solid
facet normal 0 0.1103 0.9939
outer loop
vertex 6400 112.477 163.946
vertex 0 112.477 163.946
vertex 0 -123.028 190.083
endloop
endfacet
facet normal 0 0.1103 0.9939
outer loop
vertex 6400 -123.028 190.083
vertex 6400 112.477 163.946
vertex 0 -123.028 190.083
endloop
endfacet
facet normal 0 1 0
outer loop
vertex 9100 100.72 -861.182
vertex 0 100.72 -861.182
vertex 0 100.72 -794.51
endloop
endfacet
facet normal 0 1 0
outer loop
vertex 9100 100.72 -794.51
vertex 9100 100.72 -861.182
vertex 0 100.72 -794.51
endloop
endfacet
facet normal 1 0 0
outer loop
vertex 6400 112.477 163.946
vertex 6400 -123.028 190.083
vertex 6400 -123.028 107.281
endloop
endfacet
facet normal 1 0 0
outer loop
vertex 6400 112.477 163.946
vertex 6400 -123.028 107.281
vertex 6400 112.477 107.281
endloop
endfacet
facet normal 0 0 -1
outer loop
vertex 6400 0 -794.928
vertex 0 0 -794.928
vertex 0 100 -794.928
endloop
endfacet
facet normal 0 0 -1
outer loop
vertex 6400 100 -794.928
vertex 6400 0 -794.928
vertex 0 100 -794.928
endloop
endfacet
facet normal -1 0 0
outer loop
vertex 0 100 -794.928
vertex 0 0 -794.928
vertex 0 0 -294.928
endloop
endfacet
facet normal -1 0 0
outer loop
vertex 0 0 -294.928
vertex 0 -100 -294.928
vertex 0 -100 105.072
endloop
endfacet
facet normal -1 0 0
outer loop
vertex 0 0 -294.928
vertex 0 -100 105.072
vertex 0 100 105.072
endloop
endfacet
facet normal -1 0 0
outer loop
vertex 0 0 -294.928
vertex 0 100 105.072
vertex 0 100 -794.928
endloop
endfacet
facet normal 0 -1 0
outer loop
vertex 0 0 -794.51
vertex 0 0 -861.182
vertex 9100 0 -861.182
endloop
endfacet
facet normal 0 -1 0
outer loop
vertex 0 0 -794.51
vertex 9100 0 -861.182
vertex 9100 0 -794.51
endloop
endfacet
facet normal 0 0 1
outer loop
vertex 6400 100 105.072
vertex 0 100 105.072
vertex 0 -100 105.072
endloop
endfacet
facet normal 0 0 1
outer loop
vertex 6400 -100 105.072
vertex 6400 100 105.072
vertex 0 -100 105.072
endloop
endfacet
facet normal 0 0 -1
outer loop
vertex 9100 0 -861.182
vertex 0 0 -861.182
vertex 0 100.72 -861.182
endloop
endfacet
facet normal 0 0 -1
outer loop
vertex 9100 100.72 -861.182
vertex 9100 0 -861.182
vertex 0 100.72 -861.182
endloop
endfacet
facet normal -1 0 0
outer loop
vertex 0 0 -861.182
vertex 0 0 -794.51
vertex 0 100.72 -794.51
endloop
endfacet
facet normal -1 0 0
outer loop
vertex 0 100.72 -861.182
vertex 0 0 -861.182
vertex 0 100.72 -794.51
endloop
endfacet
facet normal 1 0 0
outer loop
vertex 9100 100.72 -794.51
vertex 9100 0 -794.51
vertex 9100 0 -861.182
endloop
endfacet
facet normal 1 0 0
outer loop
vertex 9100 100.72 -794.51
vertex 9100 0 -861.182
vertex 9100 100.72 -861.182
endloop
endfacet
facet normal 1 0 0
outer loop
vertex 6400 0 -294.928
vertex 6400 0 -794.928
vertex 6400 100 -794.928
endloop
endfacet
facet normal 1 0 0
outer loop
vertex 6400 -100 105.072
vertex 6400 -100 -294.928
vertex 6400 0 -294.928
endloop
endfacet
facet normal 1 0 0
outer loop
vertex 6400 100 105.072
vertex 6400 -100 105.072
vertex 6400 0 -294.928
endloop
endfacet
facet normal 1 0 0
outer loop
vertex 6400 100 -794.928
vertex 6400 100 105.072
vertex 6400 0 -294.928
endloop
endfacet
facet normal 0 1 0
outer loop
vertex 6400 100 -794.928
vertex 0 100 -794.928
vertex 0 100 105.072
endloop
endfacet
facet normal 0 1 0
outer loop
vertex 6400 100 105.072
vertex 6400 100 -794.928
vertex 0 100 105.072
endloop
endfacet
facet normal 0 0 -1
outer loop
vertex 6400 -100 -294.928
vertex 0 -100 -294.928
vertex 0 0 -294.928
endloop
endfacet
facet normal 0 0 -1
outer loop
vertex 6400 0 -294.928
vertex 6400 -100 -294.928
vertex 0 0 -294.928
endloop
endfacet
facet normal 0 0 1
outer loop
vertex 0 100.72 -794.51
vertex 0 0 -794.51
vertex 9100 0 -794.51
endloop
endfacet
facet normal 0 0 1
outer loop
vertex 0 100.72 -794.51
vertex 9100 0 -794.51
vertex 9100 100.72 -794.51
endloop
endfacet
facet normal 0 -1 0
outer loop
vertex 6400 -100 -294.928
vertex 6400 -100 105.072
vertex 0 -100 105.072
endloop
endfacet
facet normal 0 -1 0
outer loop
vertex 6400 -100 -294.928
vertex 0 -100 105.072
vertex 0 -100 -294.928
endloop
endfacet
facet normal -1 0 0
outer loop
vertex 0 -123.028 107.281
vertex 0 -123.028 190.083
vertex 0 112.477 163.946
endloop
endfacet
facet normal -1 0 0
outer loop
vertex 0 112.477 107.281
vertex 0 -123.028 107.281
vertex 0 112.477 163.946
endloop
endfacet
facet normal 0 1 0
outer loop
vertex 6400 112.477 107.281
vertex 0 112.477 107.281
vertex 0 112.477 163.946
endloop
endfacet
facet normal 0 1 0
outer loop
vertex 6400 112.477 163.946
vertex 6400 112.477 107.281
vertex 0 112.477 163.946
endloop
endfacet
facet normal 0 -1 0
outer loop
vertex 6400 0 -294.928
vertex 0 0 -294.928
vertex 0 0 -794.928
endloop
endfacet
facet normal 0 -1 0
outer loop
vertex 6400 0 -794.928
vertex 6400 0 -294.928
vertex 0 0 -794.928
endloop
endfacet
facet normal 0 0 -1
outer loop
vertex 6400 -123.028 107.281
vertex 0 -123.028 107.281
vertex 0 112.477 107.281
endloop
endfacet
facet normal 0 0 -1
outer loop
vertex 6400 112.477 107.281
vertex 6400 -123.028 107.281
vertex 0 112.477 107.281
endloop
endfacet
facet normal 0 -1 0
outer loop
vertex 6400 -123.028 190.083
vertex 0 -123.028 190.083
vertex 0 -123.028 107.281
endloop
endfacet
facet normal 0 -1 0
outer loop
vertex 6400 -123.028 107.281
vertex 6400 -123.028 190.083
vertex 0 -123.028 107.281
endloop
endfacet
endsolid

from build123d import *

# Parameters (mm, degrees)
F3_DEPTH = 6400
F4_DEPTH = 6400
F2_W     = 100.719914
F2_H     = 66.671669
F5_DEPTH = 9100


with BuildPart() as f3:
    # F0 (on Right) → F3 (new body)
    with BuildSketch(Plane.YZ):
        Polygon((-100, 105.07169), (-100, -294.92831), (0, -294.92831), (0, -794.92831), (100, -794.92831), (100, -294.92831), (100, 105.07169), align=None)
    extrude(amount=F3_DEPTH)


with BuildPart() as f4:
    # F1 (on Right) → F4 (new body)
    with BuildSketch(Plane.YZ):
        Polygon((-123.028347, 190.082815), (-123.028347, 107.28091), (112.476942, 107.28091), (112.476942, 163.945827), align=None)
    extrude(amount=F4_DEPTH)


with BuildPart() as f5:
    # F2 (on Right) → F5 (new body)
    with BuildSketch(Plane.YZ):
        with Locations((50.359957, -827.845842)):
            Rectangle(F2_W, F2_H)
    extrude(amount=F5_DEPTH)


solid = Compound([f3.part, f4.part, f5.part])
